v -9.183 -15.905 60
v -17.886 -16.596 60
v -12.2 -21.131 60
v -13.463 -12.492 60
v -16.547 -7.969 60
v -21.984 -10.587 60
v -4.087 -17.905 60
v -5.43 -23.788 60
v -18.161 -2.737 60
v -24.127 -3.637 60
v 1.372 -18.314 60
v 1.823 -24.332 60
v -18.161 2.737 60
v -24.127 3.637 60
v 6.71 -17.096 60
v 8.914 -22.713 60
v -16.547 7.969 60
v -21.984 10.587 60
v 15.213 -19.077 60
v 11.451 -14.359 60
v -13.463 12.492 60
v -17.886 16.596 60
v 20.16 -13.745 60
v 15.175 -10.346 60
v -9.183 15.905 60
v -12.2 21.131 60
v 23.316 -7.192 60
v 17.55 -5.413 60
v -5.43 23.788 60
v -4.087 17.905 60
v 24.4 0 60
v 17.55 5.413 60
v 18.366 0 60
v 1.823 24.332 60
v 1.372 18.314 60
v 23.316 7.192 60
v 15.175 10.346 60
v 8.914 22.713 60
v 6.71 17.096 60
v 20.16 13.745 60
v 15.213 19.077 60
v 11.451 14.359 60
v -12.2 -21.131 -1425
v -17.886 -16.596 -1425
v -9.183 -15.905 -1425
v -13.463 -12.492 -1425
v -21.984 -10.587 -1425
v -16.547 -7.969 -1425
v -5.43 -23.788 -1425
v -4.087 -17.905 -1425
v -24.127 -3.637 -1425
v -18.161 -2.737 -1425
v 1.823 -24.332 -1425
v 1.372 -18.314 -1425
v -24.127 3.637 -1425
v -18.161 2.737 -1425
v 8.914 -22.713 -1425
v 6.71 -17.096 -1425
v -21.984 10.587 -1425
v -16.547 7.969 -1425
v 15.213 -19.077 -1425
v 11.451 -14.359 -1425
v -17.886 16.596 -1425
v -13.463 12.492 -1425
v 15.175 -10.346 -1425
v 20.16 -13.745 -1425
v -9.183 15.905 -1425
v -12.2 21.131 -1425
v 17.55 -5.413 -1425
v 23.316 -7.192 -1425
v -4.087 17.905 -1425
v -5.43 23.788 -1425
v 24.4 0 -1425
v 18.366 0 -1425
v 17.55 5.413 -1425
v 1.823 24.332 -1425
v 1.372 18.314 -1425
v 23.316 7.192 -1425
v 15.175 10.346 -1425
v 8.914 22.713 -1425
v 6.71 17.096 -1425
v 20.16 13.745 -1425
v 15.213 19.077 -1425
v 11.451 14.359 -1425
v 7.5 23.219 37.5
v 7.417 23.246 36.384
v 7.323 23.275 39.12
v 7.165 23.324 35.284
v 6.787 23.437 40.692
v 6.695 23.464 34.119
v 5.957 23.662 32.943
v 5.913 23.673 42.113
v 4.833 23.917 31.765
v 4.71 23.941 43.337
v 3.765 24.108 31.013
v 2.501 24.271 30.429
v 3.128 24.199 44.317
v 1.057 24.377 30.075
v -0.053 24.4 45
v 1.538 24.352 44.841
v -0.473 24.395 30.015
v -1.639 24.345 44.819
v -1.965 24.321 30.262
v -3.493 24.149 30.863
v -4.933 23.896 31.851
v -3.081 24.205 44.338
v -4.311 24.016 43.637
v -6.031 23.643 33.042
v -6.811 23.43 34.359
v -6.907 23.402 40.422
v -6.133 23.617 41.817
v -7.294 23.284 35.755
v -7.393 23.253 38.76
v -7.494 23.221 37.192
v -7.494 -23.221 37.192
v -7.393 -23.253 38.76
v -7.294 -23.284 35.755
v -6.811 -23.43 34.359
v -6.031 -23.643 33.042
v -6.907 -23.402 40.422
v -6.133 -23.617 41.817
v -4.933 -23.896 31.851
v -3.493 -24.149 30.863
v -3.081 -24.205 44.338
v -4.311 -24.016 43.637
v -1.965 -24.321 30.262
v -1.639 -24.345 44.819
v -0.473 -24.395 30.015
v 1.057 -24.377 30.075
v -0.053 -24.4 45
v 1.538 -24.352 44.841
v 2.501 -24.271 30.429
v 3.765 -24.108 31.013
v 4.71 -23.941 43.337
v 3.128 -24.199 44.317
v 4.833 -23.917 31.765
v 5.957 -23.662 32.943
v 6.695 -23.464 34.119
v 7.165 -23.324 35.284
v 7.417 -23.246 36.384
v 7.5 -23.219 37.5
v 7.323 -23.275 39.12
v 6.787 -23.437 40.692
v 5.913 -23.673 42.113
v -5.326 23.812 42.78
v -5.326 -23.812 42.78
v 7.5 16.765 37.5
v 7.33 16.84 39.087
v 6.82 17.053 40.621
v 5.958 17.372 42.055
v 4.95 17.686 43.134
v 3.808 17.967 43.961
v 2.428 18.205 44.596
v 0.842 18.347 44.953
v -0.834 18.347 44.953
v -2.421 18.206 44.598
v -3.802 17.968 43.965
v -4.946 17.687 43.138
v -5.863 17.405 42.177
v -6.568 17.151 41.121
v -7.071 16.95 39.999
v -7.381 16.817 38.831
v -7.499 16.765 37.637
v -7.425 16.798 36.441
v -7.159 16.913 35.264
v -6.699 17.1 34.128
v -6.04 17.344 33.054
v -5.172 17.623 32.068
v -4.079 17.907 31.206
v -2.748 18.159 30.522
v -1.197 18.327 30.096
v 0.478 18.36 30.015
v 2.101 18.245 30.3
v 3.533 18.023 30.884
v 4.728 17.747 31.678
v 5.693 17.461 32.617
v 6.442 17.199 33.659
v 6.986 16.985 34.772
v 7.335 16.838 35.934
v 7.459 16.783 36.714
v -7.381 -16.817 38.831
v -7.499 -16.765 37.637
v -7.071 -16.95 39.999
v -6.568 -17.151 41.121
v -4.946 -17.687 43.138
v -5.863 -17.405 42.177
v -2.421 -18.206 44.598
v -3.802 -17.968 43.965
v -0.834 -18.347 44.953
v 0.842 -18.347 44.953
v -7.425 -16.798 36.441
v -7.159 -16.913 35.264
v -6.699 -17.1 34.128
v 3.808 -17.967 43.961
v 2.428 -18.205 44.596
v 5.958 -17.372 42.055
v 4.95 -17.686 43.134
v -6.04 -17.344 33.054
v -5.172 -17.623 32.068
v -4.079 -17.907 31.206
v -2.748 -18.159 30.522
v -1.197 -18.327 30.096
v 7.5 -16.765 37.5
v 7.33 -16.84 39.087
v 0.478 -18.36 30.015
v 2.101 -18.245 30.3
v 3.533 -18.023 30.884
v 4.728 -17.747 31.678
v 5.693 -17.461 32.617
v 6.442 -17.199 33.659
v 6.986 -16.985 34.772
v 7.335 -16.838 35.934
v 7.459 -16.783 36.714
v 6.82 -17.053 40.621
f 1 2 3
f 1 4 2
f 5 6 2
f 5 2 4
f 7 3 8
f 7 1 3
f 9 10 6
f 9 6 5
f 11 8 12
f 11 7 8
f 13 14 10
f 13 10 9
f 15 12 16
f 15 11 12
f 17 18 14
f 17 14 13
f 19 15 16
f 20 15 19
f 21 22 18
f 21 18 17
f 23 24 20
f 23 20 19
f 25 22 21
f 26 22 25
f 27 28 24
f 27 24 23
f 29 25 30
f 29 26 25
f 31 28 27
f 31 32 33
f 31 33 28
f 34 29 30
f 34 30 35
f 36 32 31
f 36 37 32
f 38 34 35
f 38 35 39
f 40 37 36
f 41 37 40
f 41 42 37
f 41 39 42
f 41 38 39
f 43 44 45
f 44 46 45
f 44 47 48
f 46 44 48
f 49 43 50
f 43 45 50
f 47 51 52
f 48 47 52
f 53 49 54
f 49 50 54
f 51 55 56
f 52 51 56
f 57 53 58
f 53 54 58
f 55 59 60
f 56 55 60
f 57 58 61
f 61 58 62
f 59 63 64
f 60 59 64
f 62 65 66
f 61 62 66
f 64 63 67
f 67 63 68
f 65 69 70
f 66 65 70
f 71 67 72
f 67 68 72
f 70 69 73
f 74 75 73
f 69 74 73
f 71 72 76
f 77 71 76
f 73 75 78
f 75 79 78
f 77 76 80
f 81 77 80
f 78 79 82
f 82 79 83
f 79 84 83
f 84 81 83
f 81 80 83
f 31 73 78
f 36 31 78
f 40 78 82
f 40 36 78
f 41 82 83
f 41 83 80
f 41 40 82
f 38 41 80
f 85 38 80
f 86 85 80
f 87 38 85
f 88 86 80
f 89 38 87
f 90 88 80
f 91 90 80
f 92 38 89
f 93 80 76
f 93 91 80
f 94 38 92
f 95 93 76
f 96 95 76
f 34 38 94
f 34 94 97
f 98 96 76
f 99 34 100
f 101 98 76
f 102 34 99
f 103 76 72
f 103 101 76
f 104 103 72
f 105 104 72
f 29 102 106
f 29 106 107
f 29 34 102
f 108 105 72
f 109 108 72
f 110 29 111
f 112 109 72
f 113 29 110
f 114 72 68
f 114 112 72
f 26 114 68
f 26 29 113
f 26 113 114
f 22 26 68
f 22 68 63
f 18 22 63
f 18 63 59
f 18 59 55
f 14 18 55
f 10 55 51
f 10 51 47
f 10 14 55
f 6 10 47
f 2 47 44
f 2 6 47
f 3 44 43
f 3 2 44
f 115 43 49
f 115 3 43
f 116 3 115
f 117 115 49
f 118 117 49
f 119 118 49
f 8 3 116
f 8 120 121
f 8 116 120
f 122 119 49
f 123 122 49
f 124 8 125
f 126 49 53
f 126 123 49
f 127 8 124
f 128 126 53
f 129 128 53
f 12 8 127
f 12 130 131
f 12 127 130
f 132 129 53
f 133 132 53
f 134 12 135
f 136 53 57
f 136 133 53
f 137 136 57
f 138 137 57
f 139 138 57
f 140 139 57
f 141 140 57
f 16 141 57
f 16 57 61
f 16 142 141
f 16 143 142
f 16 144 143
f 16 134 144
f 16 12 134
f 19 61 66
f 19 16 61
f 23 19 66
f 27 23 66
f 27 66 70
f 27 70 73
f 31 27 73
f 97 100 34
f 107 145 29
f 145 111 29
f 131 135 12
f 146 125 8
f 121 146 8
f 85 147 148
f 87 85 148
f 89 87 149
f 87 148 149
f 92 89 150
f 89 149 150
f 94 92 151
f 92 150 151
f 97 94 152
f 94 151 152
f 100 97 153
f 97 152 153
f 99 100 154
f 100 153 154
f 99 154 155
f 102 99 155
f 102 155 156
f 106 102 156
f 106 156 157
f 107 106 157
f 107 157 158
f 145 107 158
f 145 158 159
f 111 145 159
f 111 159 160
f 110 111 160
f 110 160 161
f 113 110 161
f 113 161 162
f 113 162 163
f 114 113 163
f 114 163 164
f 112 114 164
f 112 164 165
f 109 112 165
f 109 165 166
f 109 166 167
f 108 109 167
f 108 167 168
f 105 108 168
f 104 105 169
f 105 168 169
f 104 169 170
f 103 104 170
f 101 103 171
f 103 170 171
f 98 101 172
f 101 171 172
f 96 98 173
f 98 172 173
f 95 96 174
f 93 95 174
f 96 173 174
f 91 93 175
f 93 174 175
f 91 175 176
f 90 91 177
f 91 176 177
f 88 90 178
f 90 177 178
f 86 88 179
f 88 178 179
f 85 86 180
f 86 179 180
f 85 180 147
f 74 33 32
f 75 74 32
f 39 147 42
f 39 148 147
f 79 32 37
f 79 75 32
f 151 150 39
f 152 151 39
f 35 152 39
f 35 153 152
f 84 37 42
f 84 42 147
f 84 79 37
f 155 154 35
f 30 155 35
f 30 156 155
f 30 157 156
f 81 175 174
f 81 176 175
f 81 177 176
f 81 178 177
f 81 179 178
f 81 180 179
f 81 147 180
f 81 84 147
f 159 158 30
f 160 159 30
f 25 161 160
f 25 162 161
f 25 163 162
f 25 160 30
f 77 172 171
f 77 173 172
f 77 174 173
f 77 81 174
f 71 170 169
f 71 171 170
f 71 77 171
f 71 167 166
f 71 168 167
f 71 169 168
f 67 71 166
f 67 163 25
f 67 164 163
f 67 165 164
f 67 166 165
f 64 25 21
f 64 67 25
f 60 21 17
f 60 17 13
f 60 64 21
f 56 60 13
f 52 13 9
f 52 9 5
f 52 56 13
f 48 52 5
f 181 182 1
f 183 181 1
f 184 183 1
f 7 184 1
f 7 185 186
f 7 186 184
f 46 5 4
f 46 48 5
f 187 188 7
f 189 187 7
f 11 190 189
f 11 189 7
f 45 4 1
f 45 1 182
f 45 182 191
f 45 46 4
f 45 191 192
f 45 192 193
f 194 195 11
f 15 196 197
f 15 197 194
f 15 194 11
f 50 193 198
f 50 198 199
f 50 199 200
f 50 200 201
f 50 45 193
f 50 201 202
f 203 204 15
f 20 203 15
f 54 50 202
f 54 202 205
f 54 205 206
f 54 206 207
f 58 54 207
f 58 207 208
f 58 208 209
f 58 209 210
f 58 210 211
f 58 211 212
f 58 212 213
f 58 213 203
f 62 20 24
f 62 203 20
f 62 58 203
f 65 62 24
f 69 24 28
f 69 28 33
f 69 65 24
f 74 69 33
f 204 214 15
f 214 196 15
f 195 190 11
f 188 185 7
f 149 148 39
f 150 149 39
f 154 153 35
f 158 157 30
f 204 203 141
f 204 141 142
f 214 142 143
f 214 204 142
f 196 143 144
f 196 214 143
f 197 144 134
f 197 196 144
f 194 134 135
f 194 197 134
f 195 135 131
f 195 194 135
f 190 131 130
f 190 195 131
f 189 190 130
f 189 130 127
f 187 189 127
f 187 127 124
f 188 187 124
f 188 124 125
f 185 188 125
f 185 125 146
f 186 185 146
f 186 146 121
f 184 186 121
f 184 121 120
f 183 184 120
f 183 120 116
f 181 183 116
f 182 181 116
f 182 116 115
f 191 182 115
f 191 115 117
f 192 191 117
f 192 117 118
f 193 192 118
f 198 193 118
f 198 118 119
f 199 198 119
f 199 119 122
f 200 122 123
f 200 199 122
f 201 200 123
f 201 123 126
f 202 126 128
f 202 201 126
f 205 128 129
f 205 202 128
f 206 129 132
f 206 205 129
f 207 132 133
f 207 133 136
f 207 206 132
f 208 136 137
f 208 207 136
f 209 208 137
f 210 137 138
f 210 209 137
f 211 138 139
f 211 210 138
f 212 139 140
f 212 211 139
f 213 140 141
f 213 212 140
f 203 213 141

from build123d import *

# Parameters (mm, degrees)
F0_R          = 24.4
F0_R_2        = 18.36585117
F1_DEPTH      = 60
F2_R          = 24.4
F2_R_2        = 18.36585117
F3_DEPTH      = 1425
F4_R          = 7.5
F5_DEPTH      = 24.401
F5_DEPTH_BACK = 24.401


with BuildPart() as f1:
    # F0 (on Top) → F1 (new body)
    with BuildSketch(Plane.XY):
        Circle(F0_R)
        Circle(F0_R_2, mode=Mode.SUBTRACT)
    extrude(amount=F1_DEPTH)

    # F2 (on Top) → F3 (join)
    with BuildSketch(Plane.XY):
        Circle(F2_R)
        Circle(F2_R_2, mode=Mode.SUBTRACT)
    extrude(amount=-F3_DEPTH)

    # F4 (on Front) → F5 (cut, two sides)
    with BuildSketch(Plane.XZ) as f5_sk:
        with Locations((0, 37.5)):
            Circle(F4_R)
    extrude(amount=-F5_DEPTH, mode=Mode.SUBTRACT)
    extrude(f5_sk.sketch, amount=F5_DEPTH_BACK, mode=Mode.SUBTRACT)


solid = f1.part
